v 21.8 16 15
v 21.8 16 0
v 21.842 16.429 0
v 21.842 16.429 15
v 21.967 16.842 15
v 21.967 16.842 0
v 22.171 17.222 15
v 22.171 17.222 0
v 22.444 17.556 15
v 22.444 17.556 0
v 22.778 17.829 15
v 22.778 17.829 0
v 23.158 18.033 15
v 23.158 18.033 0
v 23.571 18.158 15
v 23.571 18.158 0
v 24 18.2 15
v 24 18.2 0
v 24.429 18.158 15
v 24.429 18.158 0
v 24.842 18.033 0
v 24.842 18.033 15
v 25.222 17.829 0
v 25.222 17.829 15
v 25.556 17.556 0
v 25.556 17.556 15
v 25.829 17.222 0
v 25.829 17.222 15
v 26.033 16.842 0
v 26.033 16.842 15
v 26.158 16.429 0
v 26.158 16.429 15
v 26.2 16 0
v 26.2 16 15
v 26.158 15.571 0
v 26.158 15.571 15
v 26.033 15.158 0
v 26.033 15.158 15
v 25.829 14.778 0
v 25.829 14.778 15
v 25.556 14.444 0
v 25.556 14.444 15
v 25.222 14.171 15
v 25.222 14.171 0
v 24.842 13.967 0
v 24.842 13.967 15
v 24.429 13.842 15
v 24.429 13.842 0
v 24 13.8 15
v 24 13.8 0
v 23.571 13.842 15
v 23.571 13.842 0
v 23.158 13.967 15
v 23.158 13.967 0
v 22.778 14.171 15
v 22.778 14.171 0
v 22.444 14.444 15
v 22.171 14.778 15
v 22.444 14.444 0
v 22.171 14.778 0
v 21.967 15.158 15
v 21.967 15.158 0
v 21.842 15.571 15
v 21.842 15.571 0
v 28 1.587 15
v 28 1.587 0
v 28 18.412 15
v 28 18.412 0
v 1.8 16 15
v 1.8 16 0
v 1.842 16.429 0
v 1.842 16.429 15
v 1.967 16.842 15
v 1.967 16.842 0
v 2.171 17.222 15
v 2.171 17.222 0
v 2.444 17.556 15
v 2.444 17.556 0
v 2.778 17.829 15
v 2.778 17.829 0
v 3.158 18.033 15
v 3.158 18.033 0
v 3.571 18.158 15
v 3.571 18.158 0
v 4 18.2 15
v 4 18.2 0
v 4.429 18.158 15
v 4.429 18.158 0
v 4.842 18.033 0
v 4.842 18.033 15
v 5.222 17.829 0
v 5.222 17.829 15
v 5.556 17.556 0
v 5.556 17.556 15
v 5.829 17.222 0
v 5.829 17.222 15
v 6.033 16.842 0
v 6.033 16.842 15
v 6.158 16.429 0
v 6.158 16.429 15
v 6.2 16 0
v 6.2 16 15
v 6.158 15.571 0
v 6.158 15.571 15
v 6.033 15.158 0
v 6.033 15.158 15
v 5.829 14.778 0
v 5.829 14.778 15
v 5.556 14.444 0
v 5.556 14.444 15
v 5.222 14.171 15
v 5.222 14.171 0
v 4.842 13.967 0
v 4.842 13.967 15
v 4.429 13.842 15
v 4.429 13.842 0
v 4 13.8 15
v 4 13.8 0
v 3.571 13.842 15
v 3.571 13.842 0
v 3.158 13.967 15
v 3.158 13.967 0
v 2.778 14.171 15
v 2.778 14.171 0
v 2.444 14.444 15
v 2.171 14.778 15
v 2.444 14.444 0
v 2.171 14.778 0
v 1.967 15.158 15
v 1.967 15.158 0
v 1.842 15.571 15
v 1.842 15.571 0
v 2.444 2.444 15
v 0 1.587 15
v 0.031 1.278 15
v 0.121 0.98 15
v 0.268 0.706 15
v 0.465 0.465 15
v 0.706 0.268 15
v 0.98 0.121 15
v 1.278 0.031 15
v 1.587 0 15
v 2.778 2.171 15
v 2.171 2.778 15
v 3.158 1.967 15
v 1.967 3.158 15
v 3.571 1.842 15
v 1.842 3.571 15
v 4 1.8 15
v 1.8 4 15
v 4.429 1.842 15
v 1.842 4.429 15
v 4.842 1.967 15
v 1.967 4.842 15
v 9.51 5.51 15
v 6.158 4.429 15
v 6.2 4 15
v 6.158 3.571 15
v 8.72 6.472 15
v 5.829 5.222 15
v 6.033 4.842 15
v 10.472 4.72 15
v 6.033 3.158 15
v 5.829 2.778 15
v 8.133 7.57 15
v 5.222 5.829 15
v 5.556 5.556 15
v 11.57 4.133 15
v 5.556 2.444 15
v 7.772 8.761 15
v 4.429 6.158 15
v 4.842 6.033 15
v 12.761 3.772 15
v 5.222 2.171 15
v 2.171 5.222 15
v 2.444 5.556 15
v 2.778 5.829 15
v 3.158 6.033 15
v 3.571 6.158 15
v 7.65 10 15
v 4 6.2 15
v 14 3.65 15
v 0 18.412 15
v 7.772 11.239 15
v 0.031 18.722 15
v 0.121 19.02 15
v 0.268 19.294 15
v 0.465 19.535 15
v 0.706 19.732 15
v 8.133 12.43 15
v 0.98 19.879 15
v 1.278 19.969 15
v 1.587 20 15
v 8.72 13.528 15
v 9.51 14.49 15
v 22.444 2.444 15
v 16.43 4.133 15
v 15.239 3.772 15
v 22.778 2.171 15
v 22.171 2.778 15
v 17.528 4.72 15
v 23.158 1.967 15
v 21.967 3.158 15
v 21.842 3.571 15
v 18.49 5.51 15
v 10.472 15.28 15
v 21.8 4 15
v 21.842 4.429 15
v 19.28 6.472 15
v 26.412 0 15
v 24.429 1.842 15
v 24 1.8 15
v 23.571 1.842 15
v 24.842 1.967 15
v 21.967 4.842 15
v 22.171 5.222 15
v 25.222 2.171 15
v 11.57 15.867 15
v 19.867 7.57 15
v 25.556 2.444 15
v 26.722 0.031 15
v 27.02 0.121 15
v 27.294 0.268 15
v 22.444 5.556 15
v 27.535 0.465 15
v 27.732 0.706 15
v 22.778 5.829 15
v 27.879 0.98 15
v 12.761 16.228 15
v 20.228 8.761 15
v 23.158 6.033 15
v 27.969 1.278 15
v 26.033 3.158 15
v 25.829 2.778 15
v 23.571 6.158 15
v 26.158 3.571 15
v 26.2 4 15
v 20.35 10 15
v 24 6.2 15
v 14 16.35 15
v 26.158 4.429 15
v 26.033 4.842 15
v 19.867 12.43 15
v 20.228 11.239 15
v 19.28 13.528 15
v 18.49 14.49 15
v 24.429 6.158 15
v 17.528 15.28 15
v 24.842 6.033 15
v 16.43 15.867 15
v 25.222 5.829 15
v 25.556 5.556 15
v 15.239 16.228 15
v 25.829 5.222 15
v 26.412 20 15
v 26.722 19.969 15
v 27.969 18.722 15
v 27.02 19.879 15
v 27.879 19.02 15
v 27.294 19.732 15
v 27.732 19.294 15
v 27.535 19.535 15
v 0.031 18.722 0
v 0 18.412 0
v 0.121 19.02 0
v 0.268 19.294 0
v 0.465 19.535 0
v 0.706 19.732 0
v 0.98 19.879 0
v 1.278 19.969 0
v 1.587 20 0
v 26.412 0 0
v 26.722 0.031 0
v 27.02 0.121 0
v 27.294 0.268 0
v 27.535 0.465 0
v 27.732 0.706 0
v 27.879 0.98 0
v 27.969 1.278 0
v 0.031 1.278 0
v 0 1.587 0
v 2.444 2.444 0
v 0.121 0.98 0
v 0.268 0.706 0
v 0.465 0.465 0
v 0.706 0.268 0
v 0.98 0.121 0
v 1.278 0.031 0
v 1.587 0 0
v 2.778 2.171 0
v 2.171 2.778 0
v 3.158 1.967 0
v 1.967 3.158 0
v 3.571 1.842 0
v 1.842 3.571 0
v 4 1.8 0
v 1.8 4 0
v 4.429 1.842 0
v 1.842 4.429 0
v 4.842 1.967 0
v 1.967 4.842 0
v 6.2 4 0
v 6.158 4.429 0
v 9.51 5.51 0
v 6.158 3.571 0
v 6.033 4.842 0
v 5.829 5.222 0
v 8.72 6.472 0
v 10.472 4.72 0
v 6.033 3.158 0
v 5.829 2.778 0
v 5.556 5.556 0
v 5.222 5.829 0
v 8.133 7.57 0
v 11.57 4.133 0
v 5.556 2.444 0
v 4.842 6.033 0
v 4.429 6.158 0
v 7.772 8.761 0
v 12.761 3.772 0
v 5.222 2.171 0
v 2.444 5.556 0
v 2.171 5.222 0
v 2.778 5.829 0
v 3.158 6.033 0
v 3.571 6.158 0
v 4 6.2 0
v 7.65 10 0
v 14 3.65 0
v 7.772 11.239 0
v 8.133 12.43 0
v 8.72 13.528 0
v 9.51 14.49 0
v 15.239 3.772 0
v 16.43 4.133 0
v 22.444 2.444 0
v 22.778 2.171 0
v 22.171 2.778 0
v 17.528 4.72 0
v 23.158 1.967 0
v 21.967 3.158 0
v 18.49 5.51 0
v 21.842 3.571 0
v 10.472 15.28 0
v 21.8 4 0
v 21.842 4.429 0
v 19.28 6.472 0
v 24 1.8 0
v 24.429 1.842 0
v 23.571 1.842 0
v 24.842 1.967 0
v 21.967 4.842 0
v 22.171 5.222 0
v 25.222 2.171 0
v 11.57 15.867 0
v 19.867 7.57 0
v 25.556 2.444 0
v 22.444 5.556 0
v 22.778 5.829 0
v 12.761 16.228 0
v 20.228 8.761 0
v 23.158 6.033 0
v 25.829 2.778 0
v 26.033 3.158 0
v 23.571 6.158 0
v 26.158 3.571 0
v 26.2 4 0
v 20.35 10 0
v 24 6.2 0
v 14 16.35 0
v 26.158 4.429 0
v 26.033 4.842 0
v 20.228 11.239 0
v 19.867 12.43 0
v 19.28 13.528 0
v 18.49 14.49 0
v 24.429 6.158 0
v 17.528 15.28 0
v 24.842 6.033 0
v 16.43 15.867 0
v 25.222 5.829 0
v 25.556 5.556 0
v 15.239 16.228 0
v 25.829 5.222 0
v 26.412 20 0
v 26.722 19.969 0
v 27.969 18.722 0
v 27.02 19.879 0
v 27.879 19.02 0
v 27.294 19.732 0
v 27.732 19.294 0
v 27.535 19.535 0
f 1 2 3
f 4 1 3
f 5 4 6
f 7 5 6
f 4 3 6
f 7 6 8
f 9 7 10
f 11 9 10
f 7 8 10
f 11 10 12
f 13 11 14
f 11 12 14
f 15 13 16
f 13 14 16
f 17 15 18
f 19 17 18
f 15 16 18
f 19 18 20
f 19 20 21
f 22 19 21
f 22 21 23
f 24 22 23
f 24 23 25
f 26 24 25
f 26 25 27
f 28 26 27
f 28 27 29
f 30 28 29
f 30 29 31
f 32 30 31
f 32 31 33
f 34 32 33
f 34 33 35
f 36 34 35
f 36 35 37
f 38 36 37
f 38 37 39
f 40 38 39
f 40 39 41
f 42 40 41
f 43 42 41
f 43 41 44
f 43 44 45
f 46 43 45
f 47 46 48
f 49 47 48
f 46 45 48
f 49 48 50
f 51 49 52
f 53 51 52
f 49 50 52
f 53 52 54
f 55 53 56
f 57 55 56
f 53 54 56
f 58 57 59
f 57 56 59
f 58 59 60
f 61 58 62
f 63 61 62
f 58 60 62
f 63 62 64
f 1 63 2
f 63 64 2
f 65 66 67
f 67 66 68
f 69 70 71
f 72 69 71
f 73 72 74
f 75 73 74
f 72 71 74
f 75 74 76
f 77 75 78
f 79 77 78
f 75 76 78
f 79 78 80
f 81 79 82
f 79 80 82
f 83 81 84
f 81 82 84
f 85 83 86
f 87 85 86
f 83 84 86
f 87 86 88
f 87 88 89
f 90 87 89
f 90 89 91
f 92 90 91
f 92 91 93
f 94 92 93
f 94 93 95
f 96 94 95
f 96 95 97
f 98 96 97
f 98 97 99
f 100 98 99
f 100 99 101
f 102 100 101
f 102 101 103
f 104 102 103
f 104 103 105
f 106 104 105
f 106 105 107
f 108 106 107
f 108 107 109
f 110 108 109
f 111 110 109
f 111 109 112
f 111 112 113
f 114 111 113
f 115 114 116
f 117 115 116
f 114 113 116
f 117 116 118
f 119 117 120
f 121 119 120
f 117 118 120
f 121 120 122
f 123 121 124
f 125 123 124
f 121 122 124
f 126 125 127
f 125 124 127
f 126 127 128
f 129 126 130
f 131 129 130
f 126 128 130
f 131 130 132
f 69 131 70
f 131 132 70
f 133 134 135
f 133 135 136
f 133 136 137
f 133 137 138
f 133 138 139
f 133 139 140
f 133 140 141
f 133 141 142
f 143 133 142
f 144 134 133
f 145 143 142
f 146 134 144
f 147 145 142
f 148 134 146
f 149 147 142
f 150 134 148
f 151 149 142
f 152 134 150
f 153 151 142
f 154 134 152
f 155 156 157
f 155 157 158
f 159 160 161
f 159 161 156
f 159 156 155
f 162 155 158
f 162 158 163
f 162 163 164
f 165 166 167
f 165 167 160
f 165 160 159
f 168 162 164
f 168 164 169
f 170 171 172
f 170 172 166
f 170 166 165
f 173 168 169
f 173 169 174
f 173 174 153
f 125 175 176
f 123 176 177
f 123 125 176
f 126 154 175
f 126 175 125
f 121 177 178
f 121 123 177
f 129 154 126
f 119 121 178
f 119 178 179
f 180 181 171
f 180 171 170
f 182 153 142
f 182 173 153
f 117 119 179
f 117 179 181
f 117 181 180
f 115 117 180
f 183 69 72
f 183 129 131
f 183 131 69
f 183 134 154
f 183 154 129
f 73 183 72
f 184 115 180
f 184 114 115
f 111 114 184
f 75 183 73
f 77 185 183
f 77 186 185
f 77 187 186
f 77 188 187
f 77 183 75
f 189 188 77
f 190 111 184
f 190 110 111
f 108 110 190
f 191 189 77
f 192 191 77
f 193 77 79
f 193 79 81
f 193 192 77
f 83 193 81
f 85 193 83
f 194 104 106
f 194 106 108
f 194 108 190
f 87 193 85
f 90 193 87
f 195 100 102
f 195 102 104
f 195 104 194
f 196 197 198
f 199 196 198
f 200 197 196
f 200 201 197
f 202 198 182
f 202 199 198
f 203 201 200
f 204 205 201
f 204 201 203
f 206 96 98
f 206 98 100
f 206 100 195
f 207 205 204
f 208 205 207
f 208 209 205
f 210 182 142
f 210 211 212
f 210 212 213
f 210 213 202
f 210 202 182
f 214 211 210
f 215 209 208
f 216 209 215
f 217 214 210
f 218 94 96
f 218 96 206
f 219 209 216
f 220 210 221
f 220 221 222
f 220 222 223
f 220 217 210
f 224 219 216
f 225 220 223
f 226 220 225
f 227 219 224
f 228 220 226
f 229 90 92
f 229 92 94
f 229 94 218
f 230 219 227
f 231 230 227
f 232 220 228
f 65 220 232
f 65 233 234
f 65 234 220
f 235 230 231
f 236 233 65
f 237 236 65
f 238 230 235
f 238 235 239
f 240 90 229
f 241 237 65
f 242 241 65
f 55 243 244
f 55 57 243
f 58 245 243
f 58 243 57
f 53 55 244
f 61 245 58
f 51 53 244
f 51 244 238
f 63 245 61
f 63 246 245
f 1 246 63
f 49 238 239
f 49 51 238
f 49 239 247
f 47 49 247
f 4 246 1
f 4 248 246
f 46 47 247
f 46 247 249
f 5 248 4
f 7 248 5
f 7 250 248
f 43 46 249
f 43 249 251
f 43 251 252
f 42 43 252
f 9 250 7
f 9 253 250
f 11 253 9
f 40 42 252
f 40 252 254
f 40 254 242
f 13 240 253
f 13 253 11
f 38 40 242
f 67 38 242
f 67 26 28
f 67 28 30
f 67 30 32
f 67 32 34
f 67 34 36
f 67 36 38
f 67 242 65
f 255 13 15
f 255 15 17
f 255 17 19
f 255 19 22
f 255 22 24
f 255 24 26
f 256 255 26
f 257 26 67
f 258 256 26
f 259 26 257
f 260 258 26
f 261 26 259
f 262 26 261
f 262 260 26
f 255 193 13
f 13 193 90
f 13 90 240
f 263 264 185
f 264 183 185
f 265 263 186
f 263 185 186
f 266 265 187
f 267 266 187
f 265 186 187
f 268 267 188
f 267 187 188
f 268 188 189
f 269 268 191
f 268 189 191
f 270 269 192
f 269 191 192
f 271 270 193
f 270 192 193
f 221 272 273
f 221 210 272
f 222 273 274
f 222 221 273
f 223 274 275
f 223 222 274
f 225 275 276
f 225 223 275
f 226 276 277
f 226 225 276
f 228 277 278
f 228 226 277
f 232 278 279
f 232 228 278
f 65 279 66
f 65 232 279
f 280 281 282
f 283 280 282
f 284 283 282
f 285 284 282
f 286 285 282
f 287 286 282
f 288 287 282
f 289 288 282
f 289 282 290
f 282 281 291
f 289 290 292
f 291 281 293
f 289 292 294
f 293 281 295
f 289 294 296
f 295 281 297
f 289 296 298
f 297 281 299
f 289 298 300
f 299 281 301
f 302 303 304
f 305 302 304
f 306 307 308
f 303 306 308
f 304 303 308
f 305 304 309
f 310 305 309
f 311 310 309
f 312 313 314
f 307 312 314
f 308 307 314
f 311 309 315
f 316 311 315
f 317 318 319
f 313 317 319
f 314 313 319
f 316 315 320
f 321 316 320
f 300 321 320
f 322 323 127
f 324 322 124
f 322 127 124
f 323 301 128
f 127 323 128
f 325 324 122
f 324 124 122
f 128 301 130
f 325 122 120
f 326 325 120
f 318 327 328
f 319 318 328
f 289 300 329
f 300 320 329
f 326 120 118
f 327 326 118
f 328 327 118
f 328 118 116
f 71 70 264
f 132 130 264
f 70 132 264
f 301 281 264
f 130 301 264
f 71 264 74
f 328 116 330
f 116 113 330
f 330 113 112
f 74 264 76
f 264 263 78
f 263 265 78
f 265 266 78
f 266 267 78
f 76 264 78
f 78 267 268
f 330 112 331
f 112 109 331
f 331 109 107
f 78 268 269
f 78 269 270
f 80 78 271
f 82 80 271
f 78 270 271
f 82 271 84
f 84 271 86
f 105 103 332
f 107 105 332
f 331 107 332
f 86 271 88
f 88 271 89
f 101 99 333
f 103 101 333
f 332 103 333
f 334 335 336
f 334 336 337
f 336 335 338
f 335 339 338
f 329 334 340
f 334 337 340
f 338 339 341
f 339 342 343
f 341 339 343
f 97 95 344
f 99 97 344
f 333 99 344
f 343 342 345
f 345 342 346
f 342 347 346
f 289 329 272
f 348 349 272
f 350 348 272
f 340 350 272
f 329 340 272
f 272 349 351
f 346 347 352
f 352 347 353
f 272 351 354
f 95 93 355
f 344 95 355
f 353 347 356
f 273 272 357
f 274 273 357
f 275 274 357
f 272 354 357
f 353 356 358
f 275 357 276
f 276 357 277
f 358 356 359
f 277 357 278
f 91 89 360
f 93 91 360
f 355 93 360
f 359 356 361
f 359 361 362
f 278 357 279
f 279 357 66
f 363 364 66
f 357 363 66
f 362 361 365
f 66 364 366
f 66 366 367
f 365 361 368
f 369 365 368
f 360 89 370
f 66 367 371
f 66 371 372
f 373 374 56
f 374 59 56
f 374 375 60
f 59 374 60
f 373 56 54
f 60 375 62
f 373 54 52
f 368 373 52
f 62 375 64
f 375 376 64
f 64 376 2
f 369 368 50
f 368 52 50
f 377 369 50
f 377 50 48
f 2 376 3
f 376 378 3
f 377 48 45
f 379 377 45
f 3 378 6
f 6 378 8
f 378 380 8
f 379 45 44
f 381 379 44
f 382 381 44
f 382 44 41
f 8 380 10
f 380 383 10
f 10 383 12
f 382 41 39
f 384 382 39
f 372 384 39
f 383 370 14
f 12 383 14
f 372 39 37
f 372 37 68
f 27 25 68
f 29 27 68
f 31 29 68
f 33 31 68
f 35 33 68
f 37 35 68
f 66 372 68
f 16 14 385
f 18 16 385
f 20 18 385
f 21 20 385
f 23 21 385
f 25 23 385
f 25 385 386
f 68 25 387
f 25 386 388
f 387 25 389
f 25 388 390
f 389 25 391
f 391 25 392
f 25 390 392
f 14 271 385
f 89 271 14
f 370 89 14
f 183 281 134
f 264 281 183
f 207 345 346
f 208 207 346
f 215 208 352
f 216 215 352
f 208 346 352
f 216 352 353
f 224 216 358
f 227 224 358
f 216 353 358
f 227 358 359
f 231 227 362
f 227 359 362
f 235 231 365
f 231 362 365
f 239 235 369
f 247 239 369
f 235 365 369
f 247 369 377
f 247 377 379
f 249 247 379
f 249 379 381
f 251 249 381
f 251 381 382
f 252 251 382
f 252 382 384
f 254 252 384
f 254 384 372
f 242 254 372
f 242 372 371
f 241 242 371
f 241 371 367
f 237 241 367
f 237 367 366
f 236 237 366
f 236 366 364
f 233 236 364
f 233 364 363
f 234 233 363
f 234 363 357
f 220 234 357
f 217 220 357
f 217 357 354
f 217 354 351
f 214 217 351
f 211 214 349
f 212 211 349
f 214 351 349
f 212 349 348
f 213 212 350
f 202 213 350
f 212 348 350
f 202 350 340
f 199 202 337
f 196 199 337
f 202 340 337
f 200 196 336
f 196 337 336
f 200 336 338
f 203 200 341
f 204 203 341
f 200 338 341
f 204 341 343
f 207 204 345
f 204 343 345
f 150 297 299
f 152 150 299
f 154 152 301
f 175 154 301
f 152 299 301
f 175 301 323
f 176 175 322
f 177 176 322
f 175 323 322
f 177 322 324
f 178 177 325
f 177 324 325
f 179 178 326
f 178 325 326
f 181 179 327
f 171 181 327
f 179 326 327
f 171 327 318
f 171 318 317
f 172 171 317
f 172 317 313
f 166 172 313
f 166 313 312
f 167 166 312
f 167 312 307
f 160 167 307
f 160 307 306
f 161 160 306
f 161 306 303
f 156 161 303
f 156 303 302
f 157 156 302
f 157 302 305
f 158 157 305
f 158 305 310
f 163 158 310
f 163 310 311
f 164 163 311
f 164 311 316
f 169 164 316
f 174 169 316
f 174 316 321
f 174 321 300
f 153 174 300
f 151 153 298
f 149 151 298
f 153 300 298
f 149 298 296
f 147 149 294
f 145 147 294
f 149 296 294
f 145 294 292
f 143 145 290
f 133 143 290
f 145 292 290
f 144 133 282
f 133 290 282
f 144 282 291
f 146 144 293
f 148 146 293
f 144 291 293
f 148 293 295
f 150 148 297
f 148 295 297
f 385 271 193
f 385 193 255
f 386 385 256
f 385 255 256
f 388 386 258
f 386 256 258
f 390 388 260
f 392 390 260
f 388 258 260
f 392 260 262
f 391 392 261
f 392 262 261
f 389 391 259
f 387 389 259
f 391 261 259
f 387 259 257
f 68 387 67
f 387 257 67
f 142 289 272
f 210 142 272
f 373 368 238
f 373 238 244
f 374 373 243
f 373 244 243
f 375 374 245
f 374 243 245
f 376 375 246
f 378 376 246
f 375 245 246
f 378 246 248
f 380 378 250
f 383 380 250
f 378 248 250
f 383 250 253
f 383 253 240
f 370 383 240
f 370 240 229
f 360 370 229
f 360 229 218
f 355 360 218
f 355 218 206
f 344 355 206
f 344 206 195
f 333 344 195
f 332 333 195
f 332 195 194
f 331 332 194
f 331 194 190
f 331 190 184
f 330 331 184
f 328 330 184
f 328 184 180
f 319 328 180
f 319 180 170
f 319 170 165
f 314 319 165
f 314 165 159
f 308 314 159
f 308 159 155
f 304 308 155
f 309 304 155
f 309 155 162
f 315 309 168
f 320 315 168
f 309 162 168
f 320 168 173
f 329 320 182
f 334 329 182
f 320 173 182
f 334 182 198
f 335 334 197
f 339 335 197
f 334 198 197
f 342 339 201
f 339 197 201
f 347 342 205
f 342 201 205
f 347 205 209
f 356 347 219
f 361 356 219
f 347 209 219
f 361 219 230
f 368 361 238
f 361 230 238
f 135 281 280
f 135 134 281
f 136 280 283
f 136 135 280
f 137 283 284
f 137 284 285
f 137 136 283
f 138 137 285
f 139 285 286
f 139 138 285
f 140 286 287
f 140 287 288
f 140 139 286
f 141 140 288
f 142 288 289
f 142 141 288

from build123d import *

# Parameters (mm, degrees)
F0_W     = 28
F0_H     = 20
F1_DEPTH = 15
F3_D     = 4.4
F4_R     = 6.35
F5_DEPTH = 15.001
F6_R     = 1.5875


with BuildPart() as f1:
    # F0 (on Top) → F1 (new body)
    with BuildSketch(Plane.XY):
        with Locations((14, 10)):
            Rectangle(F0_W, F0_H)
    extrude(amount=F1_DEPTH)

    # F3 (through all)
    with Locations(Plane.XY.offset(15)):
        with Locations((4, 16), (4, 4), (24, 4), (24, 16)):
            Hole(F3_D / 2)

    # F4 (on face) → F5 (cut, through all)
    with BuildSketch(Plane.XY.offset(15)):
        with Locations((14, 10)):
            Circle(F4_R)
    extrude(amount=-F5_DEPTH, mode=Mode.SUBTRACT)

    # F6
    f6_edges = [f1.edges().sort_by_distance(p)[0] for p in [
        (0, 0, 7.5),
        (28, 0, 7.5),
        (28, 20, 7.5),
        (0, 20, 7.5),
    ]]
    fillet(f6_edges, radius=F6_R)


solid = f1.part
